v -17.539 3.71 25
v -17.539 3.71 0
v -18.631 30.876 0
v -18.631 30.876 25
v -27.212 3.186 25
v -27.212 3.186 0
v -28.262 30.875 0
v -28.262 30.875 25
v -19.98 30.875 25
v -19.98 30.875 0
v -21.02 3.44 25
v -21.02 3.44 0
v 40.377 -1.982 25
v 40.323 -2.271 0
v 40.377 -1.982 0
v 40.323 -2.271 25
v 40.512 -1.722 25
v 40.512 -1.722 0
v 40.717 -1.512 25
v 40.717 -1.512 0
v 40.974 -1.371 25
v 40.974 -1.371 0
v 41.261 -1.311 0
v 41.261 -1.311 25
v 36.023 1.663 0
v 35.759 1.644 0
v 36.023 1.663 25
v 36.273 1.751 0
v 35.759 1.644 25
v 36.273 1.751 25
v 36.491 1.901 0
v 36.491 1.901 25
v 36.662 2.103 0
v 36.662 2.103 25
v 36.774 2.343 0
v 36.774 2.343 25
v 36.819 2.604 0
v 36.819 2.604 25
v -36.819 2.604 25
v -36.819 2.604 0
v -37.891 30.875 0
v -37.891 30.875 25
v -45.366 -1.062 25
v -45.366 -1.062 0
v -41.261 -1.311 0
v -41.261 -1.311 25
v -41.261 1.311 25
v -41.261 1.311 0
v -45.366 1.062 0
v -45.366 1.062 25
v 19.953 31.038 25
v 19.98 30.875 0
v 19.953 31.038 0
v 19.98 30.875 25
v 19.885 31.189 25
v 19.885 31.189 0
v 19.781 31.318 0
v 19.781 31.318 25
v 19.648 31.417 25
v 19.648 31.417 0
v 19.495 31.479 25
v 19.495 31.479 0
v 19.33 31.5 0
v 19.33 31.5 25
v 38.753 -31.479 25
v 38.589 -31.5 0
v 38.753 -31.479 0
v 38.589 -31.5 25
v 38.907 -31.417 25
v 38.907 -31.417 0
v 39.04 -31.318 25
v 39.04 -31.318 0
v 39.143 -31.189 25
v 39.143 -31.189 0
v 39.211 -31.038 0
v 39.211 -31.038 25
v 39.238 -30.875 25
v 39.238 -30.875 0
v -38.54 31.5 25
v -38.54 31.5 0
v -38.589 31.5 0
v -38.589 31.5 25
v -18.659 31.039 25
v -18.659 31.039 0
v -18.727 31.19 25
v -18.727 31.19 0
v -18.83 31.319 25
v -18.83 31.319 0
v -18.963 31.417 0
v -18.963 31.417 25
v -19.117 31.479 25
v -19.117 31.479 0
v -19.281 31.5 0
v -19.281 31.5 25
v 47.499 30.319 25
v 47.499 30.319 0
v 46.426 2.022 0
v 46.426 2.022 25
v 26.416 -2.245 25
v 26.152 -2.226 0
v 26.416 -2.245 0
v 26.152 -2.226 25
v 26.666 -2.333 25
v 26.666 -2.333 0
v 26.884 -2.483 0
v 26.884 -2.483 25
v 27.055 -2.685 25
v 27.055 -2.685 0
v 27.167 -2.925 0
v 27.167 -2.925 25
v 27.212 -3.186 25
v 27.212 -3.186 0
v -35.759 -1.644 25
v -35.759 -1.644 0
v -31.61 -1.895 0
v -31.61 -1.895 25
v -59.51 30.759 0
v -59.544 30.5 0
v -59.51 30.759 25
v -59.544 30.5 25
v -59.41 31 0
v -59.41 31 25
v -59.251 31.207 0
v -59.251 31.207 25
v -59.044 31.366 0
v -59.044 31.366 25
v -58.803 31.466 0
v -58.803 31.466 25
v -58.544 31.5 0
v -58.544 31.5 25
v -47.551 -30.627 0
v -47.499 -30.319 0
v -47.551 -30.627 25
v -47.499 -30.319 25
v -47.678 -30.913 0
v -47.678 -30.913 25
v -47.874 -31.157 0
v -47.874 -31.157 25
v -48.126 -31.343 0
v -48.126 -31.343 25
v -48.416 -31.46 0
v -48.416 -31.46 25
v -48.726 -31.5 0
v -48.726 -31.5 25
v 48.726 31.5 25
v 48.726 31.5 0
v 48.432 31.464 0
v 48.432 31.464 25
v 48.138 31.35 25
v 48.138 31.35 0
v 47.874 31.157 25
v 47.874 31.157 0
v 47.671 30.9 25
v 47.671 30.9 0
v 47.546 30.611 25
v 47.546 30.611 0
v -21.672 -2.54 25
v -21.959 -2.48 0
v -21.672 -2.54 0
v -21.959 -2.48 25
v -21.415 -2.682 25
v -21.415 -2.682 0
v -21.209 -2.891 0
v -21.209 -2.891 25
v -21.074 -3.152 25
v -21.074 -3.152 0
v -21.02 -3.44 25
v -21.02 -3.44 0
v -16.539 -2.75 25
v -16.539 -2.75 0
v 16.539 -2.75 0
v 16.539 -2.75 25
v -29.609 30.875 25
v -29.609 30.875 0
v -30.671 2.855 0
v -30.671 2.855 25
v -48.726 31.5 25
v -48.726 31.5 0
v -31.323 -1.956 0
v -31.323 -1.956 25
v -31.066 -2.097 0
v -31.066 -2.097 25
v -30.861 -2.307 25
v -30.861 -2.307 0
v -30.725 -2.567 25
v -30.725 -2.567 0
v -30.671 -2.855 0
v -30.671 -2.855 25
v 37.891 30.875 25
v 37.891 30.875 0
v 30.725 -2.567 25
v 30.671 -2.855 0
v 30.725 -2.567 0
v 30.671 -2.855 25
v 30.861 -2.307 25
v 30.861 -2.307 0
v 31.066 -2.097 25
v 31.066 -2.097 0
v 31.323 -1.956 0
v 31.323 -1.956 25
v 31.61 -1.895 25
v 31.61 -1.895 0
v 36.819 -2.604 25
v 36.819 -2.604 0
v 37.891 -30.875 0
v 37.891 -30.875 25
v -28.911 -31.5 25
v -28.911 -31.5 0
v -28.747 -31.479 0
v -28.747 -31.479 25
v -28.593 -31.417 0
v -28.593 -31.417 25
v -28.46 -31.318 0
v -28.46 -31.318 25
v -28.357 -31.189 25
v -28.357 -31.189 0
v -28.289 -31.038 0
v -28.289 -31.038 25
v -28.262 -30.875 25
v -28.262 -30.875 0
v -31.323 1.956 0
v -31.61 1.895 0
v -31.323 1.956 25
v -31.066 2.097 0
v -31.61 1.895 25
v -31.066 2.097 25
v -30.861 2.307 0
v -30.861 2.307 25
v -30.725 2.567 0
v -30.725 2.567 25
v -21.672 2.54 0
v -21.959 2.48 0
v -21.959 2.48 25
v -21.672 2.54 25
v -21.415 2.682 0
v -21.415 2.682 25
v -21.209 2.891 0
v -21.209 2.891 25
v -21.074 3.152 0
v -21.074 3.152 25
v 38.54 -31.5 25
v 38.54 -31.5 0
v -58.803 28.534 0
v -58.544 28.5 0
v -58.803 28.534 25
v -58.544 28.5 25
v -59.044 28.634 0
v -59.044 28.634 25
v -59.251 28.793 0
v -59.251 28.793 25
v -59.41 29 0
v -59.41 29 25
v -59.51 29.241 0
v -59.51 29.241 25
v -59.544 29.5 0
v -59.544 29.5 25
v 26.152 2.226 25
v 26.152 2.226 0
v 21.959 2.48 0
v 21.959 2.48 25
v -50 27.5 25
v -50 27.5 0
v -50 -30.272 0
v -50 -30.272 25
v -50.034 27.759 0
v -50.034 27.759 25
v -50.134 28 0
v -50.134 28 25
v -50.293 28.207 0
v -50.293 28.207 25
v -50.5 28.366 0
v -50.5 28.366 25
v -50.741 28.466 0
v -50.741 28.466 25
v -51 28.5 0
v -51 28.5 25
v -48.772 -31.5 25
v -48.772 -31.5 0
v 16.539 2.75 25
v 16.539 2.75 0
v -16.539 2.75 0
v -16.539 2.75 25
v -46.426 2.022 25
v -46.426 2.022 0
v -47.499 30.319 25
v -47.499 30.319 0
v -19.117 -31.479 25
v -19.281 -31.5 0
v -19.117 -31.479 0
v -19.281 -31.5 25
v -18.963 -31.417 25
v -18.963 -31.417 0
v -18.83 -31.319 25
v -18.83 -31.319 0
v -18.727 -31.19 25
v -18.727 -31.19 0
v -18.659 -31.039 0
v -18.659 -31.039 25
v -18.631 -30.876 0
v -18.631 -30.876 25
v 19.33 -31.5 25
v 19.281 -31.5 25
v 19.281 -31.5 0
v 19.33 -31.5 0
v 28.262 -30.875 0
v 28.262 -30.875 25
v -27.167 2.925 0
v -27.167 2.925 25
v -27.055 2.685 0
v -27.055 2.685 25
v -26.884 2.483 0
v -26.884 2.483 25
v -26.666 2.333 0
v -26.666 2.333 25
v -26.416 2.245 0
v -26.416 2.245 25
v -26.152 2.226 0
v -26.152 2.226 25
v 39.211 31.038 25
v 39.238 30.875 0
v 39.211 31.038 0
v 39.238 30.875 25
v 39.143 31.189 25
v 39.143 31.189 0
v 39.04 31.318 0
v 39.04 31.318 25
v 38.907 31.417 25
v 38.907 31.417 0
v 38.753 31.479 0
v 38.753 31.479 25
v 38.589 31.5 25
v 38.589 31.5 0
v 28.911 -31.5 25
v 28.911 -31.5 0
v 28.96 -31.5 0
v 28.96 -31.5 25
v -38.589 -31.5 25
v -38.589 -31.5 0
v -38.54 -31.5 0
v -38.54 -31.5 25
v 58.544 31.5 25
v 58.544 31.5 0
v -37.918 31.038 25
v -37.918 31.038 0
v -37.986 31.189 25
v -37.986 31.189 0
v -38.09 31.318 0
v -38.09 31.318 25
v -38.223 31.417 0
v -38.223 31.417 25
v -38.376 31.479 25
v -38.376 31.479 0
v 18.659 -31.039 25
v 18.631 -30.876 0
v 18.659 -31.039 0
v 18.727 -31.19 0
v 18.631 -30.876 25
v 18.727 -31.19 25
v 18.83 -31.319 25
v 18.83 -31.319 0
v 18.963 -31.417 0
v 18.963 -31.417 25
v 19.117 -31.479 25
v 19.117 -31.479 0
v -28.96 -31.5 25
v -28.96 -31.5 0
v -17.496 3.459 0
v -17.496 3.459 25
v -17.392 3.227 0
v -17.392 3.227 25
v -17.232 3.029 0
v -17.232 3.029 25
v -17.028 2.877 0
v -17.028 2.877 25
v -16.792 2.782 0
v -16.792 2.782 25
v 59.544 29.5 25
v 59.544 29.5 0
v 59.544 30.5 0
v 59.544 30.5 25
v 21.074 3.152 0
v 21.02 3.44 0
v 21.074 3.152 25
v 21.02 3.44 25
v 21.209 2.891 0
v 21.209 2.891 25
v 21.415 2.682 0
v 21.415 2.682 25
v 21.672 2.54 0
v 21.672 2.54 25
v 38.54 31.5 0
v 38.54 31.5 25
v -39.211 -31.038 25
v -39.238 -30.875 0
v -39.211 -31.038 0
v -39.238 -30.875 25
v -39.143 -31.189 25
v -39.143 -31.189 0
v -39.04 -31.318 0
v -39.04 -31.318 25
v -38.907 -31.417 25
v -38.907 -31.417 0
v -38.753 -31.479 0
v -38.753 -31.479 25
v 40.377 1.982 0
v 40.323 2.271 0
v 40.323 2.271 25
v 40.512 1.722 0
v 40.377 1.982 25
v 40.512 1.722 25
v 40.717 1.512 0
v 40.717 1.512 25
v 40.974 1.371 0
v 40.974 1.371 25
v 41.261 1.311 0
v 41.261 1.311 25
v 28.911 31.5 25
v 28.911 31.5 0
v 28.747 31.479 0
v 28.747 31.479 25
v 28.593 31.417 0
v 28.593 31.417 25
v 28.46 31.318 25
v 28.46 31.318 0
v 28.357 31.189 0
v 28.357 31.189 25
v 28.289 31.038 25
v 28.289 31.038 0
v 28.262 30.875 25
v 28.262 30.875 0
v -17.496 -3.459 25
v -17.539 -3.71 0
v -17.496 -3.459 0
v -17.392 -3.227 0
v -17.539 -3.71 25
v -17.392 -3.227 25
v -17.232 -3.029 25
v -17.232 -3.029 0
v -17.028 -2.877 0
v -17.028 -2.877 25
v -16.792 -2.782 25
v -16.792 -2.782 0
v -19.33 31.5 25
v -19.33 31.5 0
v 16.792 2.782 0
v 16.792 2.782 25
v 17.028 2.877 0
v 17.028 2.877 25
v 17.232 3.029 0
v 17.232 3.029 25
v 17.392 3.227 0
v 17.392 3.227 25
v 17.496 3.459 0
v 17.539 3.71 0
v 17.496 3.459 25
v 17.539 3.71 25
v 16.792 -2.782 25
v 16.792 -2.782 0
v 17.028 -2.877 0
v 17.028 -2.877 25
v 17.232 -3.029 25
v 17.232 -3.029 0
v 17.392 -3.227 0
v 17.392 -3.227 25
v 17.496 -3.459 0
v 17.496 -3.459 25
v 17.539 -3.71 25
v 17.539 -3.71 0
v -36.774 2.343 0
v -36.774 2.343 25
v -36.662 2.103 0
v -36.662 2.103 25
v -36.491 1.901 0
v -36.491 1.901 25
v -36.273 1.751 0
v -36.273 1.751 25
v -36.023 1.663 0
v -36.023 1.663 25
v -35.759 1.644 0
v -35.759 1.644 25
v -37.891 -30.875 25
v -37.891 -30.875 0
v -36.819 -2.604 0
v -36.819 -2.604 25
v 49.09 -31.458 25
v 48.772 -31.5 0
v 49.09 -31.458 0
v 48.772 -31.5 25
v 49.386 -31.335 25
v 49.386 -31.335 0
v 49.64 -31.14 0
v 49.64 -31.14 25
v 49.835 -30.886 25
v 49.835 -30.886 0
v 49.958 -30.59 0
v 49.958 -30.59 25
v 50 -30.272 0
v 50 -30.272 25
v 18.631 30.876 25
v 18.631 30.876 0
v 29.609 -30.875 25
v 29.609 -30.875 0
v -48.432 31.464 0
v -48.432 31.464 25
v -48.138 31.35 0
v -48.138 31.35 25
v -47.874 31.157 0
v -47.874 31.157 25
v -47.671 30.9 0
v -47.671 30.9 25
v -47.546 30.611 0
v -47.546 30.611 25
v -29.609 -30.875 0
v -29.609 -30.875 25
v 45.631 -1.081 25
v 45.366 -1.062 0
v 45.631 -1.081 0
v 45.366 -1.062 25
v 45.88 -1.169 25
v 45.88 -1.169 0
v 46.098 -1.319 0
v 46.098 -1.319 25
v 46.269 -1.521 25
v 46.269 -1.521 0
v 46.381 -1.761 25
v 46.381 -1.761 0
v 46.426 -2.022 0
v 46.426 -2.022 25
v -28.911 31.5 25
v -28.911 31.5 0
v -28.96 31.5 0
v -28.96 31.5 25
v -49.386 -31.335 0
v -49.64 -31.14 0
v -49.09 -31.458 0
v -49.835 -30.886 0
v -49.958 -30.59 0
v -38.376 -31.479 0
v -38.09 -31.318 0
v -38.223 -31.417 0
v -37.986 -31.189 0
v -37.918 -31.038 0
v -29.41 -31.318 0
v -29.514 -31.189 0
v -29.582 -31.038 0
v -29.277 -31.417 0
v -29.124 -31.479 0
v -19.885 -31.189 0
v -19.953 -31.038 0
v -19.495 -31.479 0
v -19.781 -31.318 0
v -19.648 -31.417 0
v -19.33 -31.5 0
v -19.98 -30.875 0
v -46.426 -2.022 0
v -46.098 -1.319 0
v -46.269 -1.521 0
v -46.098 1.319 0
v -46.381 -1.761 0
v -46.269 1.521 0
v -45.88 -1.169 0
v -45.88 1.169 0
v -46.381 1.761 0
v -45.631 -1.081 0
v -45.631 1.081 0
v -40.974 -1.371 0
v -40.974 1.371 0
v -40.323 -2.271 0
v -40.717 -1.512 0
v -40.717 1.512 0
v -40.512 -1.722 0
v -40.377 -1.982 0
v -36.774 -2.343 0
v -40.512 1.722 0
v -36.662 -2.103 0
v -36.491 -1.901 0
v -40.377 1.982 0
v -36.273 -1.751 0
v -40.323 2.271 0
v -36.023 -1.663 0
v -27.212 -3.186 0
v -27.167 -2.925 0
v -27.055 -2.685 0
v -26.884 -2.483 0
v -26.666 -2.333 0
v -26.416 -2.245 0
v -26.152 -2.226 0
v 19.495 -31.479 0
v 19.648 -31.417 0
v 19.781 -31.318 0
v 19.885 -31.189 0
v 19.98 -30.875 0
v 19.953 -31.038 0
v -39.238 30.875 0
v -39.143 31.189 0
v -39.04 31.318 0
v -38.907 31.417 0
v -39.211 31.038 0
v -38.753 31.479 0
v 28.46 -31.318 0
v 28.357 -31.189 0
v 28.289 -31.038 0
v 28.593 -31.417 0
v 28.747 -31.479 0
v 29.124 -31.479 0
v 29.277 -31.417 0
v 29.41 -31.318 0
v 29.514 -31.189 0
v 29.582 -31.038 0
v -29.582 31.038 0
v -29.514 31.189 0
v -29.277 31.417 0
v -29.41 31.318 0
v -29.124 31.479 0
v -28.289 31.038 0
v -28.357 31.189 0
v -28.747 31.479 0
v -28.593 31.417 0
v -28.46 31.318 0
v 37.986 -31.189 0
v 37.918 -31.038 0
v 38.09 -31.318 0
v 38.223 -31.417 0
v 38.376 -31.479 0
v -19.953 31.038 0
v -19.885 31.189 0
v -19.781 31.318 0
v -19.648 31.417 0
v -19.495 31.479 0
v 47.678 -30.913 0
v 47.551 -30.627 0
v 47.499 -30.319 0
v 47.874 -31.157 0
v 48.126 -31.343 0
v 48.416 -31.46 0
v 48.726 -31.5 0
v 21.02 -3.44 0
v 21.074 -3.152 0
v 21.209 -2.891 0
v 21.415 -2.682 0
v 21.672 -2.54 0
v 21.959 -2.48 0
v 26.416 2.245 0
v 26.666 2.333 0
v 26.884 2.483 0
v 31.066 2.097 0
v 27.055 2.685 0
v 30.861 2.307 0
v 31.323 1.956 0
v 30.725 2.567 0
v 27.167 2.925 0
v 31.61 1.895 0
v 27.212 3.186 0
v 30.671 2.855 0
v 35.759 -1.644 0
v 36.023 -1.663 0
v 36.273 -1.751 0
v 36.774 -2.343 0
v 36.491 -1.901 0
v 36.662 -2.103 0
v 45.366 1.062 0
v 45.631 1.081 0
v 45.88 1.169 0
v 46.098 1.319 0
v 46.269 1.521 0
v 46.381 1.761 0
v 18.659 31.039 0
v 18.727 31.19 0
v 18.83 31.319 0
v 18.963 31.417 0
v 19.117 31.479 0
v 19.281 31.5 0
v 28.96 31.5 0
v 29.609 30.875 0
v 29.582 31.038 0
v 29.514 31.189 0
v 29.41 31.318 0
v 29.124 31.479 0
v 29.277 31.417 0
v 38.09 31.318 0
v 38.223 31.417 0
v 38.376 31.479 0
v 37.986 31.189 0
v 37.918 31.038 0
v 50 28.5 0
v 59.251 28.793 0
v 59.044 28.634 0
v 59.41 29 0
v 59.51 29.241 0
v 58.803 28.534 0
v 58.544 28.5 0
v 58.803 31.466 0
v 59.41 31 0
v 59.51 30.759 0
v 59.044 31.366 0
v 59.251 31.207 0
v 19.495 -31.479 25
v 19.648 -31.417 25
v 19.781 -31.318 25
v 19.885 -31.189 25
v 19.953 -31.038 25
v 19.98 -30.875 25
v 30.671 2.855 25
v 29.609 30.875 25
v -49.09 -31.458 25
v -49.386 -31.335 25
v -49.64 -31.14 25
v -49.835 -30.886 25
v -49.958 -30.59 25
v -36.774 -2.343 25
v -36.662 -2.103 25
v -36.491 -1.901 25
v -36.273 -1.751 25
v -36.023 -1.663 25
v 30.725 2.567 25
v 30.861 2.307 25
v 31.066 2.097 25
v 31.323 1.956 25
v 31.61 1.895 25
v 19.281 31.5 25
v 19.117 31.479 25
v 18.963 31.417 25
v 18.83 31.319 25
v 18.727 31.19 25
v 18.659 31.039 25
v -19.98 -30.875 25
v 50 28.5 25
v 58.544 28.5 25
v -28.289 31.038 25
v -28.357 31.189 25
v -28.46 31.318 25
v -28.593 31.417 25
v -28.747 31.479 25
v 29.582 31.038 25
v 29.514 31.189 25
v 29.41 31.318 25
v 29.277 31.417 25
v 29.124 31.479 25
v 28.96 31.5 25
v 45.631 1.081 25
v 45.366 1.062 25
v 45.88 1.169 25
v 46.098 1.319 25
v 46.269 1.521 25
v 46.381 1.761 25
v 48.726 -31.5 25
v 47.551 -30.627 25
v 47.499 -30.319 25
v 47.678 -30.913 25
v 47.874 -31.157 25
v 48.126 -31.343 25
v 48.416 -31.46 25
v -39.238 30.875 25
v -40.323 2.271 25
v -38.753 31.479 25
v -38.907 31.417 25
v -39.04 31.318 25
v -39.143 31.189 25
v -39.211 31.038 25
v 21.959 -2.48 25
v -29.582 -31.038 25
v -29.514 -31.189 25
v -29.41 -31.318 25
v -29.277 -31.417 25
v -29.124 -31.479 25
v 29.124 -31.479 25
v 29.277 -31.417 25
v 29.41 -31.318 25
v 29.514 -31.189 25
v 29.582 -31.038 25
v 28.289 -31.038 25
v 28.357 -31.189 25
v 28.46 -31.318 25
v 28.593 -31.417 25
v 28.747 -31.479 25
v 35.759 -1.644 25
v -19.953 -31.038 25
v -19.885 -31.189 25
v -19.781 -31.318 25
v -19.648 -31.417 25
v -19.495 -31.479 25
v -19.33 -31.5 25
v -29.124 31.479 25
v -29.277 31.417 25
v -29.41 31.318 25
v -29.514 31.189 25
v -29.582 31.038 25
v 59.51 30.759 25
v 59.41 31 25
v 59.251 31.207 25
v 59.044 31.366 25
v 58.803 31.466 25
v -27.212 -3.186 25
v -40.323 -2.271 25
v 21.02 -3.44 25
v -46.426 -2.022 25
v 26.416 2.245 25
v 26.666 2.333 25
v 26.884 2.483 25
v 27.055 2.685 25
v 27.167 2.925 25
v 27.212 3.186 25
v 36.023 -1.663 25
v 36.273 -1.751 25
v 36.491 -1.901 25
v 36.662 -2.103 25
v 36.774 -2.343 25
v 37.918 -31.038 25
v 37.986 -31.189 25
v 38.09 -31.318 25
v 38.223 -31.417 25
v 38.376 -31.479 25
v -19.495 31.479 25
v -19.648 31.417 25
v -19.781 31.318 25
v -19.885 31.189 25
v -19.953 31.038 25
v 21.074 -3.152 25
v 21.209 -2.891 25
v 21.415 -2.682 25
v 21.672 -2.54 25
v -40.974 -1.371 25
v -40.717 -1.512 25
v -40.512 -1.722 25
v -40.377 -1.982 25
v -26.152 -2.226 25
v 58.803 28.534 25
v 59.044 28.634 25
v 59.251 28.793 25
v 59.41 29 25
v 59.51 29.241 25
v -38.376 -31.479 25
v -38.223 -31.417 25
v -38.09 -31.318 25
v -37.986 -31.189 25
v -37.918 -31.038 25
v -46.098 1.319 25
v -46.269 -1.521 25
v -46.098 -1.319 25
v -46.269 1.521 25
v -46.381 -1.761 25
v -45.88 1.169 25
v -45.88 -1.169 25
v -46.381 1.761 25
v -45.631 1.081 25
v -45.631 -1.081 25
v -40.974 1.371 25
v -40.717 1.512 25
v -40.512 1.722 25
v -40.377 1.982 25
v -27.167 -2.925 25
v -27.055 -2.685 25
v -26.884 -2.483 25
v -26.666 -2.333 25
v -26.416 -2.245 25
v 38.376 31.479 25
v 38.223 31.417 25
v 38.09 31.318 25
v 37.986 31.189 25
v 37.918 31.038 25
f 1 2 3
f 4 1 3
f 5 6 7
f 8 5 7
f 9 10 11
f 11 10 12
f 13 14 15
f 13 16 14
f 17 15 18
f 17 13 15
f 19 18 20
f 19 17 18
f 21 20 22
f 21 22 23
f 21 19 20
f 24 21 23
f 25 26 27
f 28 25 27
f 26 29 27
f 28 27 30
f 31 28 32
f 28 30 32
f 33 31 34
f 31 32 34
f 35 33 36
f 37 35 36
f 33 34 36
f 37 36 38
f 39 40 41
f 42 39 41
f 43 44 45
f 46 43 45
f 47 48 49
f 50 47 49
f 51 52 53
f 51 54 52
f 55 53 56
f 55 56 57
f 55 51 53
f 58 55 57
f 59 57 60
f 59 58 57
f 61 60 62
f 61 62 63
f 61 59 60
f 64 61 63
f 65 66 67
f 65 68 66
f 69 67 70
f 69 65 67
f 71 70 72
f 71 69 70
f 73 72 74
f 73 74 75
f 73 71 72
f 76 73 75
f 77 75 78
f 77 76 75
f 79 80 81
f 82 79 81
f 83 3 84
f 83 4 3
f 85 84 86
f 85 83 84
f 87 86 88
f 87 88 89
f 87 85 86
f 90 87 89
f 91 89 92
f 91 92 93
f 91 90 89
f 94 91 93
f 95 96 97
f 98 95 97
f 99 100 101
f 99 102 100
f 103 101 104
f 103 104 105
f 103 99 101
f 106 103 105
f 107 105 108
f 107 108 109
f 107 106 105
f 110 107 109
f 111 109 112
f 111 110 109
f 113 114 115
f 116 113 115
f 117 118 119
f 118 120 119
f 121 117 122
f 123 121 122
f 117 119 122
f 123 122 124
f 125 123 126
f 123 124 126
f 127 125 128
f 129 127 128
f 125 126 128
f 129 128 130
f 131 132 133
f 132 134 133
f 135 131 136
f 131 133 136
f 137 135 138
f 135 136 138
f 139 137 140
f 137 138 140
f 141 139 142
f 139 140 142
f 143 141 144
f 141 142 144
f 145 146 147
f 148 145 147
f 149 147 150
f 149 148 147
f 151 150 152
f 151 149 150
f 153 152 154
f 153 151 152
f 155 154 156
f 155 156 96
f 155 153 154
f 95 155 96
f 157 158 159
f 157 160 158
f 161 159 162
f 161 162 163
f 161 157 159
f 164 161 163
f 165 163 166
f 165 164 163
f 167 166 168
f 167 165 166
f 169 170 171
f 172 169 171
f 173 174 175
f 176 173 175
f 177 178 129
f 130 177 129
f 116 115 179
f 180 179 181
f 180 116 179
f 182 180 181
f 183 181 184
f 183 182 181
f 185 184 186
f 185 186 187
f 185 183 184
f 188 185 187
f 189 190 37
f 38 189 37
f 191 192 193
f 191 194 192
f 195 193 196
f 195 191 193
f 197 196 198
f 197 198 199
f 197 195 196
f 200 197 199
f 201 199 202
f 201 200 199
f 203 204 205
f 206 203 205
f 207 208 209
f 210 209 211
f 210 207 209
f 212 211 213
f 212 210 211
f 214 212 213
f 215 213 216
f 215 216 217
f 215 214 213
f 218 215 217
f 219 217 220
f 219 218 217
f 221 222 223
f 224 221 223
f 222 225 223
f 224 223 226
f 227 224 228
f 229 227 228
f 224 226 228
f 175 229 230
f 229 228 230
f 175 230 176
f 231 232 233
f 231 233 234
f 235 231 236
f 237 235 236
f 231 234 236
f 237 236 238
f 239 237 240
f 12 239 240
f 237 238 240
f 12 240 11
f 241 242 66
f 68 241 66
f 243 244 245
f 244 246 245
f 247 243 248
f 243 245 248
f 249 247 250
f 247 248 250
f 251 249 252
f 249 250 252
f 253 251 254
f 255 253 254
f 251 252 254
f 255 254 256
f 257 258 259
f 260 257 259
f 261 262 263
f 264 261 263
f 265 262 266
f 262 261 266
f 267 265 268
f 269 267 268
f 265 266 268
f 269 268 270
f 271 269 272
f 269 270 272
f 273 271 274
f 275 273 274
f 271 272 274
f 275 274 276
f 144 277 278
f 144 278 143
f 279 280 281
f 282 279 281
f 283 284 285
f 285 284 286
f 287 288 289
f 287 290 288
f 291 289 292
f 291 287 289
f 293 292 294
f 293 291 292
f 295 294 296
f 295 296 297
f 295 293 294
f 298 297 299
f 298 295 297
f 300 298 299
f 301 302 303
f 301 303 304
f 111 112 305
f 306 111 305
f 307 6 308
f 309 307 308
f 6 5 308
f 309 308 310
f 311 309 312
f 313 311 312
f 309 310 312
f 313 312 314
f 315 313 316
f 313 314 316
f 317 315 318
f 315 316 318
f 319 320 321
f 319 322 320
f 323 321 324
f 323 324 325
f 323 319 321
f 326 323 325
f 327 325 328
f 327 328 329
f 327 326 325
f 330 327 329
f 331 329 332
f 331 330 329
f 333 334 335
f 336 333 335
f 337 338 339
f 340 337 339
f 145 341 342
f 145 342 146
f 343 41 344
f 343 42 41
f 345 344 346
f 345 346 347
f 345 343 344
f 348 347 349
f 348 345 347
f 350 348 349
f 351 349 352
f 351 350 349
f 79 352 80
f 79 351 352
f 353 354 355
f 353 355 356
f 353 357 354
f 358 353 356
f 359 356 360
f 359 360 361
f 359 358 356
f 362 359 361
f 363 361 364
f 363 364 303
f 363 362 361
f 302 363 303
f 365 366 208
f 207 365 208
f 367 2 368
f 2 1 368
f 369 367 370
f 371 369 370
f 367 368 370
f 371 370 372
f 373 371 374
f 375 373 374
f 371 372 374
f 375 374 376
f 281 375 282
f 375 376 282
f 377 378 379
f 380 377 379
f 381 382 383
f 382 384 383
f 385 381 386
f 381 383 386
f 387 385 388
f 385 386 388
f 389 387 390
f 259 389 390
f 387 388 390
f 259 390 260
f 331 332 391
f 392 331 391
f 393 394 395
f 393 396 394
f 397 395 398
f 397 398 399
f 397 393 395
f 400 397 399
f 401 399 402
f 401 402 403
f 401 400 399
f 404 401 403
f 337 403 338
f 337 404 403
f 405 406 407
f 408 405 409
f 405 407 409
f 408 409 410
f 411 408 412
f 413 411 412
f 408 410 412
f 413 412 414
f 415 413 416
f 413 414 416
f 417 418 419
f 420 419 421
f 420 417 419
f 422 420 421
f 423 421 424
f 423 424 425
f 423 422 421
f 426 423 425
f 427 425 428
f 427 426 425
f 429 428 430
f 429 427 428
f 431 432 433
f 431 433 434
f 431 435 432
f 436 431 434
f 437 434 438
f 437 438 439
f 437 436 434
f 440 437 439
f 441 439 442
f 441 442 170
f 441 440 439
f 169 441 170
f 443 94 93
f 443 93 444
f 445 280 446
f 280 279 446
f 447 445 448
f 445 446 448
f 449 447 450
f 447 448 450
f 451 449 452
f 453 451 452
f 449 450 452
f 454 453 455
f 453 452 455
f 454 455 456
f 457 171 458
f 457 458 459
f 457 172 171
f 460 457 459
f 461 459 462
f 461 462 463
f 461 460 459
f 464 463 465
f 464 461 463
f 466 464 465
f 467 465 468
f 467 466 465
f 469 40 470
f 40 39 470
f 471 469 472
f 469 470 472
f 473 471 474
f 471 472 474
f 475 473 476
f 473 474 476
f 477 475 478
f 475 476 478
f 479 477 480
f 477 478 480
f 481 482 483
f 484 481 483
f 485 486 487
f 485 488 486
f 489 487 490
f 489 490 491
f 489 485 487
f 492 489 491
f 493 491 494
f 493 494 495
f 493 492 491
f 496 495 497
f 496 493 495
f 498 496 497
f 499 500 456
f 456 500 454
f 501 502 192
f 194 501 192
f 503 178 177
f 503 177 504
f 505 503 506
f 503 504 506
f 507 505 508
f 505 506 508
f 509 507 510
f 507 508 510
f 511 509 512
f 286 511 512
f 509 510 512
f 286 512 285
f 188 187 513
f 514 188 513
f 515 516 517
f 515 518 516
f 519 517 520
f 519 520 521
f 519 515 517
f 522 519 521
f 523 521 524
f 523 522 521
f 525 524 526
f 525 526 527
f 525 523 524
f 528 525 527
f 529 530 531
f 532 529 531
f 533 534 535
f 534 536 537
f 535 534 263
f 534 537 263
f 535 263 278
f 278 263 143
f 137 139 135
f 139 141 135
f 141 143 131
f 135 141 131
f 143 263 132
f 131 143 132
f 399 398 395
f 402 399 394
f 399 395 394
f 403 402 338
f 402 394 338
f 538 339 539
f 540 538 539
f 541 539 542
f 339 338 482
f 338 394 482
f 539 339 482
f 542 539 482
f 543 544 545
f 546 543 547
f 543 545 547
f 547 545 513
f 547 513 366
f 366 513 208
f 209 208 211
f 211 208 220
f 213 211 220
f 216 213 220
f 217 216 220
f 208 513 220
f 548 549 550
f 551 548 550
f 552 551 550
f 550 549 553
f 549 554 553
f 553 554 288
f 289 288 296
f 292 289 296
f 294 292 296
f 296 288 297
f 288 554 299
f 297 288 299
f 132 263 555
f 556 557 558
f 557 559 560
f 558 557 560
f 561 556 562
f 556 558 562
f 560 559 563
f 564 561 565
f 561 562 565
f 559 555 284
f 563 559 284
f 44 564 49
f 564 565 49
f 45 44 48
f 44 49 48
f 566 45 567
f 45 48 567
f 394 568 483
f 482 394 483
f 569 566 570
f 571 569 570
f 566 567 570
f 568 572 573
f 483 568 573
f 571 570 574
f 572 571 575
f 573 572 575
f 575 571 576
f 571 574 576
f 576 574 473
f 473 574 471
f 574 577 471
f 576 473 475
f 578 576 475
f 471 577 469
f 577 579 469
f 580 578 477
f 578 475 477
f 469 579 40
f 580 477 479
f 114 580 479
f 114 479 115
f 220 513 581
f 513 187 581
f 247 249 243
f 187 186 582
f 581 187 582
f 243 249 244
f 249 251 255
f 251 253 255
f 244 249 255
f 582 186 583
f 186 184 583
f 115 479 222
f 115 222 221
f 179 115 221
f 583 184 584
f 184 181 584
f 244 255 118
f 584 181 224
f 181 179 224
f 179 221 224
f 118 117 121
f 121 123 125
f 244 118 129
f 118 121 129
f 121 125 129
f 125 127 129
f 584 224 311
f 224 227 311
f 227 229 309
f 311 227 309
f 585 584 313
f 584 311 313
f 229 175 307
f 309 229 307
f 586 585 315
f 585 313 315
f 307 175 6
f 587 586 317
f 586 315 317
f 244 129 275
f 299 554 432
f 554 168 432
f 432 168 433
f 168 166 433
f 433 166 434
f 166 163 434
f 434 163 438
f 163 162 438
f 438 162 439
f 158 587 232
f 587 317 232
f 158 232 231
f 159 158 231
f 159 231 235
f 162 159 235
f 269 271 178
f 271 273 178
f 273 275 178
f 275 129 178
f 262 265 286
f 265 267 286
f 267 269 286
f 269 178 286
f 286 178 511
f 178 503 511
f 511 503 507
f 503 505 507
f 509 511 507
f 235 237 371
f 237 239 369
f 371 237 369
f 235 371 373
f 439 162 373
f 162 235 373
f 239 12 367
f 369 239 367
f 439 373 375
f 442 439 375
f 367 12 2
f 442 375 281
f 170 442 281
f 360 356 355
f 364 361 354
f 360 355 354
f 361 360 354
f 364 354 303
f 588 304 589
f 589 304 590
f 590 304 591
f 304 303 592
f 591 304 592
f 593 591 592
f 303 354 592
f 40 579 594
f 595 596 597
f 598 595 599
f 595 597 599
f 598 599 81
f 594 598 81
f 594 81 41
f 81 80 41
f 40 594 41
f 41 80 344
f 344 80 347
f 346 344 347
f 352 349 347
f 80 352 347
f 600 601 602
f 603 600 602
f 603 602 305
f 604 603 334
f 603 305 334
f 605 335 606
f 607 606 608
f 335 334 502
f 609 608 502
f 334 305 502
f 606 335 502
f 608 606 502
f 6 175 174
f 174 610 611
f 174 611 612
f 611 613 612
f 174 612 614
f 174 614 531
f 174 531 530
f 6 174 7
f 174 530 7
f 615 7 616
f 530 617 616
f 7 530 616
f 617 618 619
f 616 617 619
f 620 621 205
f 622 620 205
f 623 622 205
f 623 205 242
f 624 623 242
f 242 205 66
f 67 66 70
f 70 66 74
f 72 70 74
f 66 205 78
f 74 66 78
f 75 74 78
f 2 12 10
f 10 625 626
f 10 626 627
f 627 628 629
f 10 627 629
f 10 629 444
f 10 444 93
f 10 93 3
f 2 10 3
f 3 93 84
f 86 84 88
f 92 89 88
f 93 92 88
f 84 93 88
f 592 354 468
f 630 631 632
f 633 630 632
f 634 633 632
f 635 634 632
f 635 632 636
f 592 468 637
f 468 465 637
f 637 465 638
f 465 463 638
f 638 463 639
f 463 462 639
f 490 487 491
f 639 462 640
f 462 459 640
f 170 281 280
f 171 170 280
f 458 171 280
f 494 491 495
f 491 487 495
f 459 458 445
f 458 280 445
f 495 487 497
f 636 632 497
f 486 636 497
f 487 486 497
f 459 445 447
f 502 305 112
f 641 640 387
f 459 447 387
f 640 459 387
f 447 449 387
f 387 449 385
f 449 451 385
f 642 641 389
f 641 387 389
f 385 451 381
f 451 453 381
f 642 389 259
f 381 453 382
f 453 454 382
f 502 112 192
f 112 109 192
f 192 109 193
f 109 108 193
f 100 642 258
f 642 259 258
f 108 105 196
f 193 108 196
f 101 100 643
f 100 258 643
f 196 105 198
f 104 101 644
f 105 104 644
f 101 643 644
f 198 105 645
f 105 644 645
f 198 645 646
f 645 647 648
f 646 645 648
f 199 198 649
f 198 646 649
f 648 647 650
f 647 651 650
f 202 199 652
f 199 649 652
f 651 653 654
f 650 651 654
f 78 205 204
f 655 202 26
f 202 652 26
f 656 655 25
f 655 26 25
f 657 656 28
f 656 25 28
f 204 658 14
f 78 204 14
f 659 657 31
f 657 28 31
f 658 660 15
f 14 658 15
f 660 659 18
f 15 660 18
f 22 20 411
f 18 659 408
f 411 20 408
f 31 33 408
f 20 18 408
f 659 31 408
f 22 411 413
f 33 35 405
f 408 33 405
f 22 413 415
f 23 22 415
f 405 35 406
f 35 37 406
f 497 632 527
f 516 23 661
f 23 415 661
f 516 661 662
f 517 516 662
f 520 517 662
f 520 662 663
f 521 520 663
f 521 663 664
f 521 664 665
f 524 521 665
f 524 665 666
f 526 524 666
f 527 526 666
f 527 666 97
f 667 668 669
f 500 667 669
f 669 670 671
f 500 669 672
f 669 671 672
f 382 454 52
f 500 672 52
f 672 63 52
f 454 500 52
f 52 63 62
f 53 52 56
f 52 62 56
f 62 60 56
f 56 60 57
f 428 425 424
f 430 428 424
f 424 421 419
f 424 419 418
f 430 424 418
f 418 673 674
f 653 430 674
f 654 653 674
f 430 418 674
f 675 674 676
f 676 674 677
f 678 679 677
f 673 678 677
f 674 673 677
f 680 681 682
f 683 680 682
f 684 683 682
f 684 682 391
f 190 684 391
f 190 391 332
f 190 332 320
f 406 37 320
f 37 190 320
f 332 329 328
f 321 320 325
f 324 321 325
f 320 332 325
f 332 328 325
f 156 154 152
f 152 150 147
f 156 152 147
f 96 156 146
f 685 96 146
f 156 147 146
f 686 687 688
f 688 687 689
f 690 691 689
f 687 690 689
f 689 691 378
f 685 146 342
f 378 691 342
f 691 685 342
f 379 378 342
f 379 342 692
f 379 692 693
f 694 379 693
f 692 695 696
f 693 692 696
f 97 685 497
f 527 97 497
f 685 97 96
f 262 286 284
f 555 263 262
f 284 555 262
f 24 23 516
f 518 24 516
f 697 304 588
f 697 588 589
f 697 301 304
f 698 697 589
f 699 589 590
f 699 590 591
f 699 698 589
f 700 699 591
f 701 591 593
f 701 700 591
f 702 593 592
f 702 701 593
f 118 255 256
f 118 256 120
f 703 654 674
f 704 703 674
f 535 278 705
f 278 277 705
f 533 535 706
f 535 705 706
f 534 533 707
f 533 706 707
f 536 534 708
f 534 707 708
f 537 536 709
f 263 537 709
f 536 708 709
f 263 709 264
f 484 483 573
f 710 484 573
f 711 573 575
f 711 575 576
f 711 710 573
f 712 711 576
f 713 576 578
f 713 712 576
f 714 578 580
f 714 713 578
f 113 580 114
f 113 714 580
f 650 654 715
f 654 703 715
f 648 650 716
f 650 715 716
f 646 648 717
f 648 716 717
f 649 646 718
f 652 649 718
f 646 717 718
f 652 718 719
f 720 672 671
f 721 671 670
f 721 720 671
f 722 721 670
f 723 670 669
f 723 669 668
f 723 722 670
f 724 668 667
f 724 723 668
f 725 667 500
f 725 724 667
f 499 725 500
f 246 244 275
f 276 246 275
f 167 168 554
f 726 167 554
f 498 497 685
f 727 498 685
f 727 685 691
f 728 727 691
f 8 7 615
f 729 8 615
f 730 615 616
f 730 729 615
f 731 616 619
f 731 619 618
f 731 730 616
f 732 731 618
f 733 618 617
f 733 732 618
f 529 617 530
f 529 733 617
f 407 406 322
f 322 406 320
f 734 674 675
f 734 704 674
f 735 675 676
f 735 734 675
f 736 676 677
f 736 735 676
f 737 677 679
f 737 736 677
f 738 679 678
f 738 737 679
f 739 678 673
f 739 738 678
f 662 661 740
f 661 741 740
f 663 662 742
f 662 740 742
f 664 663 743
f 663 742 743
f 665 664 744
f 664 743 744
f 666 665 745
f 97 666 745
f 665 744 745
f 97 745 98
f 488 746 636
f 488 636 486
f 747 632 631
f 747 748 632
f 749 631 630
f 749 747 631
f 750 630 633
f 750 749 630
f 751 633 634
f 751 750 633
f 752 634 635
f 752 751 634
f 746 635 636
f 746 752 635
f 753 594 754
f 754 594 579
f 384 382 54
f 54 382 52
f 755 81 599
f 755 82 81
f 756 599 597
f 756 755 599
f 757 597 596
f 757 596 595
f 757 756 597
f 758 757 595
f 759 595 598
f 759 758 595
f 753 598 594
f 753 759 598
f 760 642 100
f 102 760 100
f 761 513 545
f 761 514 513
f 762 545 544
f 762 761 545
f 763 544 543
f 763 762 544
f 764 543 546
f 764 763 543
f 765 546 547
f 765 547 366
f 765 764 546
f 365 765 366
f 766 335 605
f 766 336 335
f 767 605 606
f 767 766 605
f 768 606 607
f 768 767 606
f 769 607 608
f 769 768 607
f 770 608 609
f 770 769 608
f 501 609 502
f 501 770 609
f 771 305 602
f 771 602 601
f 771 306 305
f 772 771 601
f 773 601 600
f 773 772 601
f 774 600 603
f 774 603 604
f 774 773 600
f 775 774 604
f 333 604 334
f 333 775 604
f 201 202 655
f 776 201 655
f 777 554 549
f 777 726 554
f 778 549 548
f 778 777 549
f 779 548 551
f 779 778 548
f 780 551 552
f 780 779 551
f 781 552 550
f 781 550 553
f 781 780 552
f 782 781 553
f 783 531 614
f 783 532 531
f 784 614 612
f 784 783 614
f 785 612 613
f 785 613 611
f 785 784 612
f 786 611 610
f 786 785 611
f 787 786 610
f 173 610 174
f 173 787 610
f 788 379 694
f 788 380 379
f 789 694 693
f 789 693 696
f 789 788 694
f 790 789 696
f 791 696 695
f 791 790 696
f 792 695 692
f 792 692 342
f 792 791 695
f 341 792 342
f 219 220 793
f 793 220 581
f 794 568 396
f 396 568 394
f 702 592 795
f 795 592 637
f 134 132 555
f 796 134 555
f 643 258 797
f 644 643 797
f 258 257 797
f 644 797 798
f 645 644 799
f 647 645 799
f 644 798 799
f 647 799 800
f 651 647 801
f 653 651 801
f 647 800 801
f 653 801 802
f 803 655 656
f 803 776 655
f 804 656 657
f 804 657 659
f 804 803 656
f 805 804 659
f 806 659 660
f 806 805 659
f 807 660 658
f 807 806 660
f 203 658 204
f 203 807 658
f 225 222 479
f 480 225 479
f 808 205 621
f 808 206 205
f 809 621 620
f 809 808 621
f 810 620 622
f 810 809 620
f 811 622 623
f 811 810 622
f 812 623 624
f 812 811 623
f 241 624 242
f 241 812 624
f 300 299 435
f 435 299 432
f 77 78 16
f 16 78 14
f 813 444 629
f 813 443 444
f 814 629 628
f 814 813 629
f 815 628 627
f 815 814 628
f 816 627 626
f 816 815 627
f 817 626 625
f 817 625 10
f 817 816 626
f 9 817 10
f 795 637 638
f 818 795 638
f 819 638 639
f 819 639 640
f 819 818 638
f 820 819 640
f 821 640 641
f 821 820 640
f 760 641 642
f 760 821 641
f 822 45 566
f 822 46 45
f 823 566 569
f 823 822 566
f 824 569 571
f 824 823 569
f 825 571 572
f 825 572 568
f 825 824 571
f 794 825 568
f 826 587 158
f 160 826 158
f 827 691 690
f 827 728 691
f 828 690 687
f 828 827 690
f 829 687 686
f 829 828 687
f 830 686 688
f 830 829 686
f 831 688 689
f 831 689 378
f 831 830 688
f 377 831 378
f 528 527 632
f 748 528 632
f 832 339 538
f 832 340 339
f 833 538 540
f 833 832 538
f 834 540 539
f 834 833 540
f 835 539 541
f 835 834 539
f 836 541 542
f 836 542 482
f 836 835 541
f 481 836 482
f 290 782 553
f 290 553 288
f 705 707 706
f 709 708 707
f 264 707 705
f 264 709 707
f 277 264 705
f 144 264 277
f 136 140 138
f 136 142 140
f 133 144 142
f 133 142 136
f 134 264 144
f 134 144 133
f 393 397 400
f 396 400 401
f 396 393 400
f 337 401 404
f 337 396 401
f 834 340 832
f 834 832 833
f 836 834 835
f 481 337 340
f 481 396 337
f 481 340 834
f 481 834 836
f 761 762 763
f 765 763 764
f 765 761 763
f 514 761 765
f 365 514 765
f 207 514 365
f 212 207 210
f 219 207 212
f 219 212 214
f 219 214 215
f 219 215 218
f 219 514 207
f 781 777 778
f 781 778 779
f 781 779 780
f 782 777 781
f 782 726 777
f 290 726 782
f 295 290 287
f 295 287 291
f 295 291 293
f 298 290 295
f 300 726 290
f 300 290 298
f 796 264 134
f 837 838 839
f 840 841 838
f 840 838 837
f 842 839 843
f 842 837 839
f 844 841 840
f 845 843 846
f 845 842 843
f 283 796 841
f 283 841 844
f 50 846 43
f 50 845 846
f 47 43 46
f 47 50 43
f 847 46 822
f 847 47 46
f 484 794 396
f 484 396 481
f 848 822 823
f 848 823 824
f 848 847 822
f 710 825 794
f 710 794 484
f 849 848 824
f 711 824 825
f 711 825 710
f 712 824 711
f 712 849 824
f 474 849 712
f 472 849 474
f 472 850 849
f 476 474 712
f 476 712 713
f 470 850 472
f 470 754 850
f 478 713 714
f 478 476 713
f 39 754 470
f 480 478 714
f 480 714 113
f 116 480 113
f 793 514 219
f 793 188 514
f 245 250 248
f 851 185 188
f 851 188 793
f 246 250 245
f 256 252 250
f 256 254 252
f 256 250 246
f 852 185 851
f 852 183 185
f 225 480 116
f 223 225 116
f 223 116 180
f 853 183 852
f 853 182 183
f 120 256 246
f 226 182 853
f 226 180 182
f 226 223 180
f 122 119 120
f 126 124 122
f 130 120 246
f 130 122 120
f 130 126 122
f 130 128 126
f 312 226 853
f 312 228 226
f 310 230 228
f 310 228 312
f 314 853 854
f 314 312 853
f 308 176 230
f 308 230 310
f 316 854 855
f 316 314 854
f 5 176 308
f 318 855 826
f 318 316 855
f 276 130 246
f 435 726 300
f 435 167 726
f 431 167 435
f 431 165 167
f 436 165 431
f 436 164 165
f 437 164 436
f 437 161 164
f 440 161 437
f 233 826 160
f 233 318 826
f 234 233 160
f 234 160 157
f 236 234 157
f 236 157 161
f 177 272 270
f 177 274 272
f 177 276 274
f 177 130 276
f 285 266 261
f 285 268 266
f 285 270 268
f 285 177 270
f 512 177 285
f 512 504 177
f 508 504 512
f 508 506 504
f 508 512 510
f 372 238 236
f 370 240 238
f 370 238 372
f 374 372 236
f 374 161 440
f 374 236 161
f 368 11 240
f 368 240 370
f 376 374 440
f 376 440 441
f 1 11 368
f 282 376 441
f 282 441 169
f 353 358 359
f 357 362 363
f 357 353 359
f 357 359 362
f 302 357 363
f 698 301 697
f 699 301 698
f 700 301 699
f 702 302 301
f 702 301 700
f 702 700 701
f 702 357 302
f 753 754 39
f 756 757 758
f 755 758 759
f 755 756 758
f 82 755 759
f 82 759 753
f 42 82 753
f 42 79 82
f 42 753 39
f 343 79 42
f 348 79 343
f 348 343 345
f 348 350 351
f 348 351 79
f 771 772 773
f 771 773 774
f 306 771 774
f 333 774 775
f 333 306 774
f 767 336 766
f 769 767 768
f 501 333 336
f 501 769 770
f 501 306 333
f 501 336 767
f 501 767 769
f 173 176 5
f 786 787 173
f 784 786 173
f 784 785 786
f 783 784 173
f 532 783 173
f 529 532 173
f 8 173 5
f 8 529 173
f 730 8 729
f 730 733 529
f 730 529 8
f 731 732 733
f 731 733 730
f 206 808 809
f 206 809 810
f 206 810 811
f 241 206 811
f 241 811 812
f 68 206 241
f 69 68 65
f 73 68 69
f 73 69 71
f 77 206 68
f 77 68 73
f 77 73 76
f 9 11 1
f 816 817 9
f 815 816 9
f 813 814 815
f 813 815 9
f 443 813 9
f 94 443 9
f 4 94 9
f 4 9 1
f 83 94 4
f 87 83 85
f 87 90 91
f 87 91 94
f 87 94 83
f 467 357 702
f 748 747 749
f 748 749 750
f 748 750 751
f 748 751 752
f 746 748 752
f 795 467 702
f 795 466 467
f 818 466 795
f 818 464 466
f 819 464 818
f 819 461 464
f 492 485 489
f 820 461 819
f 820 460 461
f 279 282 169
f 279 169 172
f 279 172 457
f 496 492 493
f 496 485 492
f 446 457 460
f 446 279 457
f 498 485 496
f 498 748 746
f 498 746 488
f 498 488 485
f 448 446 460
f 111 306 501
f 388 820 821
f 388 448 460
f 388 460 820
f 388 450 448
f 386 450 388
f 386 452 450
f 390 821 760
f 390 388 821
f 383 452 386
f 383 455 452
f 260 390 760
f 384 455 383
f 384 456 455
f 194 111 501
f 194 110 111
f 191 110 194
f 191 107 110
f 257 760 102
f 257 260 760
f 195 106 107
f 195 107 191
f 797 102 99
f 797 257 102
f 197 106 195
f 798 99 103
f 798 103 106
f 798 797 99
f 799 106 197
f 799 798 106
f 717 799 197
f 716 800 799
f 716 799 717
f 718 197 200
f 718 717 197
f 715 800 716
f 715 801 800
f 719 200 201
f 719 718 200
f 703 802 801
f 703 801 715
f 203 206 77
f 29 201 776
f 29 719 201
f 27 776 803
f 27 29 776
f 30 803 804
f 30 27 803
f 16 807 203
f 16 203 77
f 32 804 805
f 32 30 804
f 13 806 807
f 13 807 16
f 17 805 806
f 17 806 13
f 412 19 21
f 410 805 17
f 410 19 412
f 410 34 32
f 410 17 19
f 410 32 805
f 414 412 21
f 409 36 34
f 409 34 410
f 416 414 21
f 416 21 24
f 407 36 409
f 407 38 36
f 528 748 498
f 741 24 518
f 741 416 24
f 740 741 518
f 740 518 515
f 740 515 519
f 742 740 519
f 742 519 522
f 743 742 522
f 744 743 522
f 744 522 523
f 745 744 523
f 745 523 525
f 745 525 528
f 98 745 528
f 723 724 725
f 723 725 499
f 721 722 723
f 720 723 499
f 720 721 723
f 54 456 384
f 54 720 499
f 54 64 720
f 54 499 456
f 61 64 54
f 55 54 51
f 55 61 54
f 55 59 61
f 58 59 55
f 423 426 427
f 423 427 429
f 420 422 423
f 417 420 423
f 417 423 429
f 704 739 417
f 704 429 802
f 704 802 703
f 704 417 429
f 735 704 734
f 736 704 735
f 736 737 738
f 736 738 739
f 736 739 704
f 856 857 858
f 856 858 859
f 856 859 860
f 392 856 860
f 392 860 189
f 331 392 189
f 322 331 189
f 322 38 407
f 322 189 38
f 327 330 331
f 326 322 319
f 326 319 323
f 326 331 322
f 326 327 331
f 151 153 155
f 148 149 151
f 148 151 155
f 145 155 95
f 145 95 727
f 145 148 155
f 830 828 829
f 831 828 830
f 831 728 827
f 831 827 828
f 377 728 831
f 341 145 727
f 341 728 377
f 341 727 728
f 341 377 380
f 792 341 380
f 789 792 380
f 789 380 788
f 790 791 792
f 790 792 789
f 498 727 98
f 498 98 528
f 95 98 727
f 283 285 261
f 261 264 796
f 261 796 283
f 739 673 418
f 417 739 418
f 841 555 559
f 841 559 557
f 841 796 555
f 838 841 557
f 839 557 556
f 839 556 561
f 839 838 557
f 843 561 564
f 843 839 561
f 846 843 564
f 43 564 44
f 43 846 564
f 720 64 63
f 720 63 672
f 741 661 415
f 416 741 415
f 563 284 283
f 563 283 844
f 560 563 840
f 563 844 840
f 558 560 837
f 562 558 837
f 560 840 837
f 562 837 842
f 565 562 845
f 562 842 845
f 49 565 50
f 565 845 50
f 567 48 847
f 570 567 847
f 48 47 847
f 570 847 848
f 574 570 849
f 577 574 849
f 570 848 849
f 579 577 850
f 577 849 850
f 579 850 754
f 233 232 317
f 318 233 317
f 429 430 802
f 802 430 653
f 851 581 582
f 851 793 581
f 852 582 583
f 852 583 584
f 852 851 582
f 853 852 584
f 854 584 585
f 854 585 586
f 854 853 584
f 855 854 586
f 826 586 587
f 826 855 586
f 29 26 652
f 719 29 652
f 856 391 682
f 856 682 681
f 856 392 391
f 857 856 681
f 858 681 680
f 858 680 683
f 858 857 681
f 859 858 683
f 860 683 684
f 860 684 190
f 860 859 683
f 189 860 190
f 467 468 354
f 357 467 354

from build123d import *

# Parameters (mm, degrees)
F0_W     = 9.543723
F0_H     = 3
F0_W_2   = 2.456277
F1_DEPTH = 25
F2_R     = 0.65
F3_R     = 1.228
F4_R     = 1


with BuildPart() as f1:
    # F0 (on Top) → F1 (new body)
    with BuildSketch(Plane.XY):
        with Locations((-54.771861, 30)):
            Rectangle(F0_W, F0_H)
        with Locations((-48.771861, 30)):
            Rectangle(F0_W_2, F0_H)
        Polygon((-46.387445, 1), (-47.543723, 31.5), (-47.543723, 28.5), (-50, 28.5), (-50, 0), (-50, -31.5), (-47.543723, -31.5), (-46.387445, -1), (-40.370852, -1), (-40.357002, -1.365324), (-36.780361, -1.581997), (-36.758297, -1), (-30.741703, -1), (-30.705688, -1.95), (-27.173276, -2.163993), (-27.129148, -1), (-21.112555, -1), (-21.054374, -2.534676), (-17.5, -2.75), (0, -2.75), (17.5, -2.75), (21.054374, -2.534676), (21.112555, -1), (27.129148, -1), (27.173276, -2.163993), (30.705688, -1.95), (30.741703, -1), (36.758297, -1), (36.780361, -1.581997), (40.357002, -1.365324), (40.370852, -1), (46.387445, -1), (47.543723, -31.5), (50, -31.5), (50, 0), (50, 28.5), (47.543723, 28.5), (47.543723, 31.5), (46.387445, 1), (40.370852, 1), (40.357002, 1.365324), (36.780361, 1.581997), (36.758297, 1), (30.741703, 1), (30.705688, 1.95), (27.173276, 2.163993), (27.129148, 1), (21.112555, 1), (21.054374, 2.534676), (17.5, 2.75), (0, 2.75), (-17.5, 2.75), (-21.054374, 2.534676), (-21.112555, 1), (-27.129148, 1), (-27.173276, 2.163993), (-30.705688, 1.95), (-30.741703, 1), (-36.758297, 1), (-36.780361, 1.581997), (-40.357002, 1.365324), (-40.370852, 1), align=None)
        Polygon((-36.780361, -1.581997), (-40.357002, -1.365324), (-39.214574, -31.5), (-37.914574, -31.5), align=None)
        Polygon((-39.214574, 31.5), (-40.357002, 1.365324), (-36.780361, 1.581997), (-37.914574, 31.5), align=None)
        Polygon((-27.173276, -2.163993), (-30.705688, -1.95), (-29.585426, -31.5), (-28.285426, -31.5), align=None)
        Polygon((-29.585426, 31.5), (-30.705688, 1.95), (-27.173276, 2.163993), (-28.285426, 31.5), align=None)
        Polygon((-17.5, -2.75), (-21.054374, -2.534676), (-19.956277, -31.5), (-18.656277, -31.5), align=None)
        Polygon((-19.956277, 31.5), (-21.054374, 2.534676), (-17.5, 2.75), (-18.656277, 31.5), align=None)
        Polygon((21.054374, -2.534676), (17.5, -2.75), (18.656277, -31.5), (19.956277, -31.5), align=None)
        Polygon((18.656277, 31.5), (17.5, 2.75), (21.054374, 2.534676), (19.956277, 31.5), align=None)
        Polygon((28.285426, 31.5), (27.173276, 2.163993), (30.705688, 1.95), (29.585426, 31.5), align=None)
        Polygon((30.705688, -1.95), (27.173276, -2.163993), (28.285426, -31.5), (29.585426, -31.5), align=None)
        Polygon((40.357002, -1.365324), (36.780361, -1.581997), (37.914574, -31.5), (39.214574, -31.5), align=None)
        Polygon((37.914574, 31.5), (36.780361, 1.581997), (40.357002, 1.365324), (39.214574, 31.5), align=None)
        with Locations((54.771861, 30)):
            Rectangle(F0_W, F0_H)
        with Locations((48.771861, 30)):
            Rectangle(F0_W_2, F0_H)
        Polygon((-36.758297, -1), (-36.780361, -1.581997), (-30.705688, -1.95), (-30.741703, -1), align=None)
        Polygon((-27.129148, -1), (-27.173276, -2.163993), (-21.054374, -2.534676), (-21.112555, -1), align=None)
        Polygon((-21.054374, 2.534676), (-27.173276, 2.163993), (-27.129148, 1), (-21.112555, 1), align=None)
        Polygon((-30.705688, 1.95), (-36.780361, 1.581997), (-36.758297, 1), (-30.741703, 1), align=None)
        Polygon((-40.357002, 1.365324), (-46.387445, 1), (-40.370852, 1), align=None)
        Polygon((-40.370852, -1), (-46.387445, -1), (-40.357002, -1.365324), align=None)
        Polygon((21.112555, -1), (21.054374, -2.534676), (27.173276, -2.163993), (27.129148, -1), align=None)
        Polygon((27.173276, 2.163993), (21.054374, 2.534676), (21.112555, 1), (27.129148, 1), align=None)
        Polygon((36.780361, 1.581997), (30.705688, 1.95), (30.741703, 1), (36.758297, 1), align=None)
        Polygon((30.741703, -1), (30.705688, -1.95), (36.780361, -1.581997), (36.758297, -1), align=None)
        Polygon((40.370852, -1), (40.357002, -1.365324), (46.387445, -1), align=None)
        Polygon((46.387445, 1), (40.357002, 1.365324), (40.370852, 1), align=None)
    extrude(amount=F1_DEPTH)

    # F2
    f2_edges = [f1.edges().sort_by_distance(p)[0] for p in [
        (29.585426, 31.5, 12.5),
        (28.285426, 31.5, 12.5),
        (39.214574, 31.5, 12.5),
        (37.914574, 31.5, 12.5),
        (19.956277, 31.5, 12.5),
        (18.656277, 31.5, 12.5),
        (-18.656277, 31.5, 12.5),
        (-19.956277, 31.5, 12.5),
        (-28.285426, 31.5, 12.5),
        (-29.585426, 31.5, 12.5),
        (-37.914574, 31.5, 12.5),
        (-39.214574, 31.5, 12.5),
        (-39.214574, -31.5, 12.5),
        (-37.914574, -31.5, 12.5),
        (-29.585426, -31.5, 12.5),
        (-28.285426, -31.5, 12.5),
        (-19.956277, -31.5, 12.5),
        (-18.656277, -31.5, 12.5),
        (18.656277, -31.5, 12.5),
        (19.956277, -31.5, 12.5),
        (28.285426, -31.5, 12.5),
        (29.585426, -31.5, 12.5),
        (37.914574, -31.5, 12.5),
        (39.214574, -31.5, 12.5),
    ]]
    fillet(f2_edges, radius=F2_R)

    # F3
    f3_edges = [f1.edges().sort_by_distance(p)[0] for p in [
        (-50, -31.5, 12.5),
        (-47.543723, -31.5, 12.5),
        (47.543723, -31.5, 12.5),
        (50, -31.5, 12.5),
        (-47.543723, 31.5, 12.5),
        (47.543723, 31.5, 12.5),
    ]]
    fillet(f3_edges, radius=F3_R)

    # F4
    f4_edges = [f1.edges().sort_by_distance(p)[0] for p in [
        (-50, 28.5, 12.5),
        (-40.357002, 1.365324, 12.5),
        (-46.387445, 1, 12.5),
        (-36.780361, 1.581997, 12.5),
        (-30.705688, 1.95, 12.5),
        (-21.054374, 2.534676, 12.5),
        (-27.173276, 2.163993, 12.5),
        (-40.357002, -1.365324, 12.5),
        (-46.387445, -1, 12.5),
        (-30.705688, -1.95, 12.5),
        (-21.054374, -2.534676, 12.5),
        (-27.173276, -2.163993, 12.5),
        (-36.780361, -1.581997, 12.5),
        (-17.5, 2.75, 12.5),
        (-17.5, -2.75, 12.5),
        (17.5, -2.75, 12.5),
        (17.5, 2.75, 12.5),
        (27.173276, 2.163993, 12.5),
        (27.173276, -2.163993, 12.5),
        (36.780361, -1.581997, 12.5),
        (30.705688, -1.95, 12.5),
        (30.705688, 1.95, 12.5),
        (36.780361, 1.581997, 12.5),
        (40.357002, -1.365324, 12.5),
        (40.357002, 1.365324, 12.5),
        (46.387445, 1, 12.5),
        (46.387445, -1, 12.5),
        (-59.543723, 31.5, 12.5),
        (-59.543723, 28.5, 12.5),
        (59.543723, 31.5, 12.5),
        (59.543723, 28.5, 12.5),
        (21.054374, 2.534676, 12.5),
        (21.054374, -2.534676, 12.5),
    ]]
    fillet(f4_edges, radius=F4_R)


solid = f1.part
